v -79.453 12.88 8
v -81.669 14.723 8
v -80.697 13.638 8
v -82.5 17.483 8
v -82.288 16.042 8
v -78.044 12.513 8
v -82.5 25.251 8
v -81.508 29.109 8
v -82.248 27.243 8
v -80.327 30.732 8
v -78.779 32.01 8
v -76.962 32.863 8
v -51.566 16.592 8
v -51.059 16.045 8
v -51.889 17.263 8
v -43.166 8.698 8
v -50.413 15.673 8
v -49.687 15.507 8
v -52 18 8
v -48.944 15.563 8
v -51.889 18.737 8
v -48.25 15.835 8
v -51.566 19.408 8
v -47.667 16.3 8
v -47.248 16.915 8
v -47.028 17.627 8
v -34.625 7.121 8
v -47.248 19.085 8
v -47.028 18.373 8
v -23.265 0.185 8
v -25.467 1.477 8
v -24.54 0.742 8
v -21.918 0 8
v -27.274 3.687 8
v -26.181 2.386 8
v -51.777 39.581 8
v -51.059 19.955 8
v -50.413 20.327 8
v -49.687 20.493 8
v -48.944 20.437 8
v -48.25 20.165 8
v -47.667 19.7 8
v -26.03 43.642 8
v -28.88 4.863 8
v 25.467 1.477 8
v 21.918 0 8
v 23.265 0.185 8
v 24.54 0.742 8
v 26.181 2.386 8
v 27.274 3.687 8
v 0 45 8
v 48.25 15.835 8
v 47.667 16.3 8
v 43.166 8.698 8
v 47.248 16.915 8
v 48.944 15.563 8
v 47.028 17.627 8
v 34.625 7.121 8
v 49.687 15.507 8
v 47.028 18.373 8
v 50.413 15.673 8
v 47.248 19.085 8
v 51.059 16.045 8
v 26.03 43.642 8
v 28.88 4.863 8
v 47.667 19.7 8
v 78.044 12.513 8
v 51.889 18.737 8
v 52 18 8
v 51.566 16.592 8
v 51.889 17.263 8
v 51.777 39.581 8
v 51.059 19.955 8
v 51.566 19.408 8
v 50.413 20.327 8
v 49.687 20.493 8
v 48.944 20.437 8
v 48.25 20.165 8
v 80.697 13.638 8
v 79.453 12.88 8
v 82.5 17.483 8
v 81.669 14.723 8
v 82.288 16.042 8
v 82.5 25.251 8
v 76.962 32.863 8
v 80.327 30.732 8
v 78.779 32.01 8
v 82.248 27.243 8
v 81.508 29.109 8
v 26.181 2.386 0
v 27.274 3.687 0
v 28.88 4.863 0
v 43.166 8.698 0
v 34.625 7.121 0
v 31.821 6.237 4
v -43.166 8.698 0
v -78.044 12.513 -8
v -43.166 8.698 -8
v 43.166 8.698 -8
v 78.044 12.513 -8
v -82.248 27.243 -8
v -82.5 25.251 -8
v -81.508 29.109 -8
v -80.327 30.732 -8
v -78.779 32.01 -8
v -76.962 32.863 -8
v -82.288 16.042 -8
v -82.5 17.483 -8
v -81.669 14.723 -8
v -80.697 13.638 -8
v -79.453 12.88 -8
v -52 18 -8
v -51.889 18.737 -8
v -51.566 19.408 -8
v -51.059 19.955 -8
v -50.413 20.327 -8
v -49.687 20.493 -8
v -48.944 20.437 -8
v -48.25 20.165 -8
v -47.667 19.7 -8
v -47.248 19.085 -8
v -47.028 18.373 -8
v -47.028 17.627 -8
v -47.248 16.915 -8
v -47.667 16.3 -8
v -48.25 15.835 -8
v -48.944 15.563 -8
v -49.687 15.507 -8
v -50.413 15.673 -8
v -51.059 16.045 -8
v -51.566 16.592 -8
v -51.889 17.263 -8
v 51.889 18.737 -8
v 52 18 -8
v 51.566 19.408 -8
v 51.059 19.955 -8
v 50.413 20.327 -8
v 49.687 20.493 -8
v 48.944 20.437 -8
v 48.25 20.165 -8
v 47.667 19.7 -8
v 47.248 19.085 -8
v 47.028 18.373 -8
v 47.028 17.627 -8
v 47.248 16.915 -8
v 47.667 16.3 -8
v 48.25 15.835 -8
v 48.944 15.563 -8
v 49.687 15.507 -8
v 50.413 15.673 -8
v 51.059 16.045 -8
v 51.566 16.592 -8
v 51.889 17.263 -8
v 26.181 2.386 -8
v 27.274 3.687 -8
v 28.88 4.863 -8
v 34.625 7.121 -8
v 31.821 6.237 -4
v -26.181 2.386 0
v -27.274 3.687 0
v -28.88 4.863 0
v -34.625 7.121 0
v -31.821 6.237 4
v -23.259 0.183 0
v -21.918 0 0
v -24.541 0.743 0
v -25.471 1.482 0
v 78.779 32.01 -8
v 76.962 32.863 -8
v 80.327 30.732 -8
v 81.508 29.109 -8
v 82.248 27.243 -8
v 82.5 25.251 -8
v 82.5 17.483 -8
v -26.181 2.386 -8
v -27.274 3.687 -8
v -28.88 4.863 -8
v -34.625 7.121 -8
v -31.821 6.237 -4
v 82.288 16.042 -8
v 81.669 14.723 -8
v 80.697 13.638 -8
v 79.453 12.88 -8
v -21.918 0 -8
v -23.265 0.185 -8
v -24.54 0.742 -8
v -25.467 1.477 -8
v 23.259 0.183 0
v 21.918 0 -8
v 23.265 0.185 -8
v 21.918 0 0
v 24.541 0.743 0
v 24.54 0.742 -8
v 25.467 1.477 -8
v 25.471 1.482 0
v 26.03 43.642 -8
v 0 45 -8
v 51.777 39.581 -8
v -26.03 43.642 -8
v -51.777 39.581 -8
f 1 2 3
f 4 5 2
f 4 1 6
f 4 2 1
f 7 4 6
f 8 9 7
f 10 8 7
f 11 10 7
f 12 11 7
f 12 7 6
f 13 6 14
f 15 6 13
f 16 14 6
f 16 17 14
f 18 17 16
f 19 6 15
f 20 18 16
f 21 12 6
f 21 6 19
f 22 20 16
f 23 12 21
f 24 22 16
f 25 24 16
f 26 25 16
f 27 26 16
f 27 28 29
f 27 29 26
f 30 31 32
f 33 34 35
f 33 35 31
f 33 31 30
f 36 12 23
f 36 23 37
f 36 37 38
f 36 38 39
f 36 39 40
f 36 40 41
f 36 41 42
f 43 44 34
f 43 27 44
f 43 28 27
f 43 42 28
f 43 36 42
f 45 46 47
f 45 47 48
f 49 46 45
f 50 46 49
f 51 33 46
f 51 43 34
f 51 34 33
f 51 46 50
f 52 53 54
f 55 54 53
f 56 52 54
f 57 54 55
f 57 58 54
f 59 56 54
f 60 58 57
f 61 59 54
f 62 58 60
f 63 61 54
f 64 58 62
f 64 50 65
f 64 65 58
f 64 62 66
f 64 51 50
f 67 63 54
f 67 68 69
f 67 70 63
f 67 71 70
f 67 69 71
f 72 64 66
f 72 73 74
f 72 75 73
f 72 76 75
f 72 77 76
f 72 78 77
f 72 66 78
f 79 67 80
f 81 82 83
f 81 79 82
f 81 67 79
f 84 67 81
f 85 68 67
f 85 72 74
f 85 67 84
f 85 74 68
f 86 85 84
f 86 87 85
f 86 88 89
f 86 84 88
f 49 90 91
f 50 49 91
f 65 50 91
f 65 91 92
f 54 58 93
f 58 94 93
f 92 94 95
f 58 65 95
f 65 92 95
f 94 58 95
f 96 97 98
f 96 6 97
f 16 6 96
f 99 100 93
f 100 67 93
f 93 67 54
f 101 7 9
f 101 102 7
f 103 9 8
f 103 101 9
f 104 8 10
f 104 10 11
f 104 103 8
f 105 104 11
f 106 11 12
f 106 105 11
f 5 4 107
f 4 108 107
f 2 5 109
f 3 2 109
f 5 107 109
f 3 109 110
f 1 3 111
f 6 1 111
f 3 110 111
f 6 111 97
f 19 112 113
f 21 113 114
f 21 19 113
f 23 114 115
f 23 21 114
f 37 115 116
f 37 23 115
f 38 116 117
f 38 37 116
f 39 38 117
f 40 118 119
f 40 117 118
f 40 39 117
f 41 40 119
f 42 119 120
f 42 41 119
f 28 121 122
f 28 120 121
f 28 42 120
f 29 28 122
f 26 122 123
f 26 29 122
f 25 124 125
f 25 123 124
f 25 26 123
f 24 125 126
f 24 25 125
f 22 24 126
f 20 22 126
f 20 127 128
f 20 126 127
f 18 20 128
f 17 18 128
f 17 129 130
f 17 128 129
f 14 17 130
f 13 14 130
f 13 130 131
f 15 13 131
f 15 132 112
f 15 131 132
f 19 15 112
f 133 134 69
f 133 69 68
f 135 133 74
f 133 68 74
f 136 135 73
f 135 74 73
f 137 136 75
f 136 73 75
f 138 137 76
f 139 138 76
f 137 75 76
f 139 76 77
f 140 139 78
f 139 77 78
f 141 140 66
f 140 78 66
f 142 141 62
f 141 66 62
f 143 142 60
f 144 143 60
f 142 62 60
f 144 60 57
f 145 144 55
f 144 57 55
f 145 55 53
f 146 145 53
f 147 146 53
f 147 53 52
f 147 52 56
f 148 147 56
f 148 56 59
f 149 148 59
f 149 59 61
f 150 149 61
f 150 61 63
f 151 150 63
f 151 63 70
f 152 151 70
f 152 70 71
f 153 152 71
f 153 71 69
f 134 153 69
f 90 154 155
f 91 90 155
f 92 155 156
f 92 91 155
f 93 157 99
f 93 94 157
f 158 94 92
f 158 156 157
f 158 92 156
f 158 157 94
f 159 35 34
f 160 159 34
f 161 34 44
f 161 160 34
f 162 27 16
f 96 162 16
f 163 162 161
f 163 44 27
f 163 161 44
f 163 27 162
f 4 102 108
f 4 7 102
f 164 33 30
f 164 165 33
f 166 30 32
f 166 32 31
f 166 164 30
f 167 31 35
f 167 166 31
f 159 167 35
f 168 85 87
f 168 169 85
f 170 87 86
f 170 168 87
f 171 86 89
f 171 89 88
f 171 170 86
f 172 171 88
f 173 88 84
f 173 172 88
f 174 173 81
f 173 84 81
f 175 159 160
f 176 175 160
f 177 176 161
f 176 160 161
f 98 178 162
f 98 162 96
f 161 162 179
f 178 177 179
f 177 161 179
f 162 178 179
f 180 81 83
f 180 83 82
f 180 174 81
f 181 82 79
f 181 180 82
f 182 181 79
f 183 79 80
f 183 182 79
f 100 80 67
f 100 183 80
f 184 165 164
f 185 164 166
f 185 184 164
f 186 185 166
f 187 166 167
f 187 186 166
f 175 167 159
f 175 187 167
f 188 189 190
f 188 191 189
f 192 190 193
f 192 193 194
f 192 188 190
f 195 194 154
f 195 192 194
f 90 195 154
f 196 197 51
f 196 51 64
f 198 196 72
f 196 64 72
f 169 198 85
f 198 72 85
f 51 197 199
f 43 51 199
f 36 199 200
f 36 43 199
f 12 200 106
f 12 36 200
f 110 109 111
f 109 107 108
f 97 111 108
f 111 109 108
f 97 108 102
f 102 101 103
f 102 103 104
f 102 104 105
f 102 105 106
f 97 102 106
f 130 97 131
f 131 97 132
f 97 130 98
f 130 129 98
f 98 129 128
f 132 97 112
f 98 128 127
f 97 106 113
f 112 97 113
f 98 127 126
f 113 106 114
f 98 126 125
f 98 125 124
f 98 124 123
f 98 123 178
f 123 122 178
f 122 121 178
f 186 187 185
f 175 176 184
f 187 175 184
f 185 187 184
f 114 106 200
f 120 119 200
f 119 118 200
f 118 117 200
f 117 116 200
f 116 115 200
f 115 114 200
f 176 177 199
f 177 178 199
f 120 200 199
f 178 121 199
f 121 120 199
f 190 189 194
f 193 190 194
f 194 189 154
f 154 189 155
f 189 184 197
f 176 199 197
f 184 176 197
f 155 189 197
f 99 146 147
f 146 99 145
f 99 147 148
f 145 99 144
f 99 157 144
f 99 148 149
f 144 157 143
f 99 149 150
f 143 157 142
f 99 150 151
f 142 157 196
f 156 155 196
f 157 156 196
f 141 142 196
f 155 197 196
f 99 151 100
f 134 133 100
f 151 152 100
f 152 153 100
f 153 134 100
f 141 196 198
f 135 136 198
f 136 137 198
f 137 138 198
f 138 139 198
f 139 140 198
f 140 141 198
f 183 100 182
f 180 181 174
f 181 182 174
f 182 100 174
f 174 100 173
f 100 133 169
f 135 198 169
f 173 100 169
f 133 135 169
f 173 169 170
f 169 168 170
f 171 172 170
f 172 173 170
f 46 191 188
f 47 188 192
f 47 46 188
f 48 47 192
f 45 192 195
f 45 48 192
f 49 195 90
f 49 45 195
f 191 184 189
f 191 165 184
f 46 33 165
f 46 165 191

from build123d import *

# Parameters (mm, degrees)
BOSS_EXTRUDE1_DEPTH = 8
FILLET1_R           = 8
FILLET2_R           = 5
FILLET3_R           = 5
SKETCH2_R           = 2.5
CUT_EXTRUDE1_DEPTH  = 96.327068709


with BuildPart() as part:
    # Sketch1 → Boss-Extrude1 (new, symmetric)
    with BuildSketch(Plane.XY):
        with BuildLine():
            Line((0, 0), (0, 45))
            ThreePointArc((0, 45), (41.839723947, 41.475158976), (82.5, 31))
            Line((82.5, 31), (82.5, 13))
            Line((82.5, 13), (43.165682973, 8.697844187))
            add(Edge.make_bspline(
                [(25.5, 0), (25.5, 6.5), (43.165682973, 8.697844187)],
                knots=[0, 0, 0, 1, 1, 1], degree=2))
            Line((25.5, 0), (0, 0))
        make_face()
    boss_extrude1 = extrude(amount=BOSS_EXTRUDE1_DEPTH, both=True)

    # Mirror1: Boss-Extrude1 across plane
    add(boss_extrude1.mirror(Plane(origin=(0, 0, 0), x_dir=(0, 0, 1), z_dir=(1, 0, 0))))

    # Fillet1
    fillet1_edges = [part.edges().sort_by_distance(p)[0] for p in [
        (82.5, 31, 0),
        (-82.5, 31, 0),
    ]]
    fillet(fillet1_edges, radius=FILLET1_R)

    # Fillet2
    fillet2_edges = [part.edges().sort_by_distance(p)[0] for p in [
        (82.5, 13, 0),
        (-82.5, 13, 0),
    ]]
    fillet(fillet2_edges, radius=FILLET2_R)

    # Fillet3
    fillet3_edges = [part.edges().sort_by_distance(p)[0] for p in [
        (25.5, 0, 4),
        (-25.5, 0, -4),
    ]]
    fillet(fillet3_edges, radius=FILLET3_R)

    # Sketch2 → Cut-Extrude1 (cut, through all)
    with BuildSketch(Plane.XY.offset(8)):
        with Locations((49.5, 18)):
            Circle(SKETCH2_R)
    cut_extrude1 = extrude(amount=-CUT_EXTRUDE1_DEPTH, mode=Mode.SUBTRACT)

    # Mirror4: Cut-Extrude1 across plane
    add(cut_extrude1.mirror(Plane(origin=(0, 0, 0), x_dir=(0, 0, 1), z_dir=(1, 0, 0))), mode=Mode.SUBTRACT)


solid = part.part
